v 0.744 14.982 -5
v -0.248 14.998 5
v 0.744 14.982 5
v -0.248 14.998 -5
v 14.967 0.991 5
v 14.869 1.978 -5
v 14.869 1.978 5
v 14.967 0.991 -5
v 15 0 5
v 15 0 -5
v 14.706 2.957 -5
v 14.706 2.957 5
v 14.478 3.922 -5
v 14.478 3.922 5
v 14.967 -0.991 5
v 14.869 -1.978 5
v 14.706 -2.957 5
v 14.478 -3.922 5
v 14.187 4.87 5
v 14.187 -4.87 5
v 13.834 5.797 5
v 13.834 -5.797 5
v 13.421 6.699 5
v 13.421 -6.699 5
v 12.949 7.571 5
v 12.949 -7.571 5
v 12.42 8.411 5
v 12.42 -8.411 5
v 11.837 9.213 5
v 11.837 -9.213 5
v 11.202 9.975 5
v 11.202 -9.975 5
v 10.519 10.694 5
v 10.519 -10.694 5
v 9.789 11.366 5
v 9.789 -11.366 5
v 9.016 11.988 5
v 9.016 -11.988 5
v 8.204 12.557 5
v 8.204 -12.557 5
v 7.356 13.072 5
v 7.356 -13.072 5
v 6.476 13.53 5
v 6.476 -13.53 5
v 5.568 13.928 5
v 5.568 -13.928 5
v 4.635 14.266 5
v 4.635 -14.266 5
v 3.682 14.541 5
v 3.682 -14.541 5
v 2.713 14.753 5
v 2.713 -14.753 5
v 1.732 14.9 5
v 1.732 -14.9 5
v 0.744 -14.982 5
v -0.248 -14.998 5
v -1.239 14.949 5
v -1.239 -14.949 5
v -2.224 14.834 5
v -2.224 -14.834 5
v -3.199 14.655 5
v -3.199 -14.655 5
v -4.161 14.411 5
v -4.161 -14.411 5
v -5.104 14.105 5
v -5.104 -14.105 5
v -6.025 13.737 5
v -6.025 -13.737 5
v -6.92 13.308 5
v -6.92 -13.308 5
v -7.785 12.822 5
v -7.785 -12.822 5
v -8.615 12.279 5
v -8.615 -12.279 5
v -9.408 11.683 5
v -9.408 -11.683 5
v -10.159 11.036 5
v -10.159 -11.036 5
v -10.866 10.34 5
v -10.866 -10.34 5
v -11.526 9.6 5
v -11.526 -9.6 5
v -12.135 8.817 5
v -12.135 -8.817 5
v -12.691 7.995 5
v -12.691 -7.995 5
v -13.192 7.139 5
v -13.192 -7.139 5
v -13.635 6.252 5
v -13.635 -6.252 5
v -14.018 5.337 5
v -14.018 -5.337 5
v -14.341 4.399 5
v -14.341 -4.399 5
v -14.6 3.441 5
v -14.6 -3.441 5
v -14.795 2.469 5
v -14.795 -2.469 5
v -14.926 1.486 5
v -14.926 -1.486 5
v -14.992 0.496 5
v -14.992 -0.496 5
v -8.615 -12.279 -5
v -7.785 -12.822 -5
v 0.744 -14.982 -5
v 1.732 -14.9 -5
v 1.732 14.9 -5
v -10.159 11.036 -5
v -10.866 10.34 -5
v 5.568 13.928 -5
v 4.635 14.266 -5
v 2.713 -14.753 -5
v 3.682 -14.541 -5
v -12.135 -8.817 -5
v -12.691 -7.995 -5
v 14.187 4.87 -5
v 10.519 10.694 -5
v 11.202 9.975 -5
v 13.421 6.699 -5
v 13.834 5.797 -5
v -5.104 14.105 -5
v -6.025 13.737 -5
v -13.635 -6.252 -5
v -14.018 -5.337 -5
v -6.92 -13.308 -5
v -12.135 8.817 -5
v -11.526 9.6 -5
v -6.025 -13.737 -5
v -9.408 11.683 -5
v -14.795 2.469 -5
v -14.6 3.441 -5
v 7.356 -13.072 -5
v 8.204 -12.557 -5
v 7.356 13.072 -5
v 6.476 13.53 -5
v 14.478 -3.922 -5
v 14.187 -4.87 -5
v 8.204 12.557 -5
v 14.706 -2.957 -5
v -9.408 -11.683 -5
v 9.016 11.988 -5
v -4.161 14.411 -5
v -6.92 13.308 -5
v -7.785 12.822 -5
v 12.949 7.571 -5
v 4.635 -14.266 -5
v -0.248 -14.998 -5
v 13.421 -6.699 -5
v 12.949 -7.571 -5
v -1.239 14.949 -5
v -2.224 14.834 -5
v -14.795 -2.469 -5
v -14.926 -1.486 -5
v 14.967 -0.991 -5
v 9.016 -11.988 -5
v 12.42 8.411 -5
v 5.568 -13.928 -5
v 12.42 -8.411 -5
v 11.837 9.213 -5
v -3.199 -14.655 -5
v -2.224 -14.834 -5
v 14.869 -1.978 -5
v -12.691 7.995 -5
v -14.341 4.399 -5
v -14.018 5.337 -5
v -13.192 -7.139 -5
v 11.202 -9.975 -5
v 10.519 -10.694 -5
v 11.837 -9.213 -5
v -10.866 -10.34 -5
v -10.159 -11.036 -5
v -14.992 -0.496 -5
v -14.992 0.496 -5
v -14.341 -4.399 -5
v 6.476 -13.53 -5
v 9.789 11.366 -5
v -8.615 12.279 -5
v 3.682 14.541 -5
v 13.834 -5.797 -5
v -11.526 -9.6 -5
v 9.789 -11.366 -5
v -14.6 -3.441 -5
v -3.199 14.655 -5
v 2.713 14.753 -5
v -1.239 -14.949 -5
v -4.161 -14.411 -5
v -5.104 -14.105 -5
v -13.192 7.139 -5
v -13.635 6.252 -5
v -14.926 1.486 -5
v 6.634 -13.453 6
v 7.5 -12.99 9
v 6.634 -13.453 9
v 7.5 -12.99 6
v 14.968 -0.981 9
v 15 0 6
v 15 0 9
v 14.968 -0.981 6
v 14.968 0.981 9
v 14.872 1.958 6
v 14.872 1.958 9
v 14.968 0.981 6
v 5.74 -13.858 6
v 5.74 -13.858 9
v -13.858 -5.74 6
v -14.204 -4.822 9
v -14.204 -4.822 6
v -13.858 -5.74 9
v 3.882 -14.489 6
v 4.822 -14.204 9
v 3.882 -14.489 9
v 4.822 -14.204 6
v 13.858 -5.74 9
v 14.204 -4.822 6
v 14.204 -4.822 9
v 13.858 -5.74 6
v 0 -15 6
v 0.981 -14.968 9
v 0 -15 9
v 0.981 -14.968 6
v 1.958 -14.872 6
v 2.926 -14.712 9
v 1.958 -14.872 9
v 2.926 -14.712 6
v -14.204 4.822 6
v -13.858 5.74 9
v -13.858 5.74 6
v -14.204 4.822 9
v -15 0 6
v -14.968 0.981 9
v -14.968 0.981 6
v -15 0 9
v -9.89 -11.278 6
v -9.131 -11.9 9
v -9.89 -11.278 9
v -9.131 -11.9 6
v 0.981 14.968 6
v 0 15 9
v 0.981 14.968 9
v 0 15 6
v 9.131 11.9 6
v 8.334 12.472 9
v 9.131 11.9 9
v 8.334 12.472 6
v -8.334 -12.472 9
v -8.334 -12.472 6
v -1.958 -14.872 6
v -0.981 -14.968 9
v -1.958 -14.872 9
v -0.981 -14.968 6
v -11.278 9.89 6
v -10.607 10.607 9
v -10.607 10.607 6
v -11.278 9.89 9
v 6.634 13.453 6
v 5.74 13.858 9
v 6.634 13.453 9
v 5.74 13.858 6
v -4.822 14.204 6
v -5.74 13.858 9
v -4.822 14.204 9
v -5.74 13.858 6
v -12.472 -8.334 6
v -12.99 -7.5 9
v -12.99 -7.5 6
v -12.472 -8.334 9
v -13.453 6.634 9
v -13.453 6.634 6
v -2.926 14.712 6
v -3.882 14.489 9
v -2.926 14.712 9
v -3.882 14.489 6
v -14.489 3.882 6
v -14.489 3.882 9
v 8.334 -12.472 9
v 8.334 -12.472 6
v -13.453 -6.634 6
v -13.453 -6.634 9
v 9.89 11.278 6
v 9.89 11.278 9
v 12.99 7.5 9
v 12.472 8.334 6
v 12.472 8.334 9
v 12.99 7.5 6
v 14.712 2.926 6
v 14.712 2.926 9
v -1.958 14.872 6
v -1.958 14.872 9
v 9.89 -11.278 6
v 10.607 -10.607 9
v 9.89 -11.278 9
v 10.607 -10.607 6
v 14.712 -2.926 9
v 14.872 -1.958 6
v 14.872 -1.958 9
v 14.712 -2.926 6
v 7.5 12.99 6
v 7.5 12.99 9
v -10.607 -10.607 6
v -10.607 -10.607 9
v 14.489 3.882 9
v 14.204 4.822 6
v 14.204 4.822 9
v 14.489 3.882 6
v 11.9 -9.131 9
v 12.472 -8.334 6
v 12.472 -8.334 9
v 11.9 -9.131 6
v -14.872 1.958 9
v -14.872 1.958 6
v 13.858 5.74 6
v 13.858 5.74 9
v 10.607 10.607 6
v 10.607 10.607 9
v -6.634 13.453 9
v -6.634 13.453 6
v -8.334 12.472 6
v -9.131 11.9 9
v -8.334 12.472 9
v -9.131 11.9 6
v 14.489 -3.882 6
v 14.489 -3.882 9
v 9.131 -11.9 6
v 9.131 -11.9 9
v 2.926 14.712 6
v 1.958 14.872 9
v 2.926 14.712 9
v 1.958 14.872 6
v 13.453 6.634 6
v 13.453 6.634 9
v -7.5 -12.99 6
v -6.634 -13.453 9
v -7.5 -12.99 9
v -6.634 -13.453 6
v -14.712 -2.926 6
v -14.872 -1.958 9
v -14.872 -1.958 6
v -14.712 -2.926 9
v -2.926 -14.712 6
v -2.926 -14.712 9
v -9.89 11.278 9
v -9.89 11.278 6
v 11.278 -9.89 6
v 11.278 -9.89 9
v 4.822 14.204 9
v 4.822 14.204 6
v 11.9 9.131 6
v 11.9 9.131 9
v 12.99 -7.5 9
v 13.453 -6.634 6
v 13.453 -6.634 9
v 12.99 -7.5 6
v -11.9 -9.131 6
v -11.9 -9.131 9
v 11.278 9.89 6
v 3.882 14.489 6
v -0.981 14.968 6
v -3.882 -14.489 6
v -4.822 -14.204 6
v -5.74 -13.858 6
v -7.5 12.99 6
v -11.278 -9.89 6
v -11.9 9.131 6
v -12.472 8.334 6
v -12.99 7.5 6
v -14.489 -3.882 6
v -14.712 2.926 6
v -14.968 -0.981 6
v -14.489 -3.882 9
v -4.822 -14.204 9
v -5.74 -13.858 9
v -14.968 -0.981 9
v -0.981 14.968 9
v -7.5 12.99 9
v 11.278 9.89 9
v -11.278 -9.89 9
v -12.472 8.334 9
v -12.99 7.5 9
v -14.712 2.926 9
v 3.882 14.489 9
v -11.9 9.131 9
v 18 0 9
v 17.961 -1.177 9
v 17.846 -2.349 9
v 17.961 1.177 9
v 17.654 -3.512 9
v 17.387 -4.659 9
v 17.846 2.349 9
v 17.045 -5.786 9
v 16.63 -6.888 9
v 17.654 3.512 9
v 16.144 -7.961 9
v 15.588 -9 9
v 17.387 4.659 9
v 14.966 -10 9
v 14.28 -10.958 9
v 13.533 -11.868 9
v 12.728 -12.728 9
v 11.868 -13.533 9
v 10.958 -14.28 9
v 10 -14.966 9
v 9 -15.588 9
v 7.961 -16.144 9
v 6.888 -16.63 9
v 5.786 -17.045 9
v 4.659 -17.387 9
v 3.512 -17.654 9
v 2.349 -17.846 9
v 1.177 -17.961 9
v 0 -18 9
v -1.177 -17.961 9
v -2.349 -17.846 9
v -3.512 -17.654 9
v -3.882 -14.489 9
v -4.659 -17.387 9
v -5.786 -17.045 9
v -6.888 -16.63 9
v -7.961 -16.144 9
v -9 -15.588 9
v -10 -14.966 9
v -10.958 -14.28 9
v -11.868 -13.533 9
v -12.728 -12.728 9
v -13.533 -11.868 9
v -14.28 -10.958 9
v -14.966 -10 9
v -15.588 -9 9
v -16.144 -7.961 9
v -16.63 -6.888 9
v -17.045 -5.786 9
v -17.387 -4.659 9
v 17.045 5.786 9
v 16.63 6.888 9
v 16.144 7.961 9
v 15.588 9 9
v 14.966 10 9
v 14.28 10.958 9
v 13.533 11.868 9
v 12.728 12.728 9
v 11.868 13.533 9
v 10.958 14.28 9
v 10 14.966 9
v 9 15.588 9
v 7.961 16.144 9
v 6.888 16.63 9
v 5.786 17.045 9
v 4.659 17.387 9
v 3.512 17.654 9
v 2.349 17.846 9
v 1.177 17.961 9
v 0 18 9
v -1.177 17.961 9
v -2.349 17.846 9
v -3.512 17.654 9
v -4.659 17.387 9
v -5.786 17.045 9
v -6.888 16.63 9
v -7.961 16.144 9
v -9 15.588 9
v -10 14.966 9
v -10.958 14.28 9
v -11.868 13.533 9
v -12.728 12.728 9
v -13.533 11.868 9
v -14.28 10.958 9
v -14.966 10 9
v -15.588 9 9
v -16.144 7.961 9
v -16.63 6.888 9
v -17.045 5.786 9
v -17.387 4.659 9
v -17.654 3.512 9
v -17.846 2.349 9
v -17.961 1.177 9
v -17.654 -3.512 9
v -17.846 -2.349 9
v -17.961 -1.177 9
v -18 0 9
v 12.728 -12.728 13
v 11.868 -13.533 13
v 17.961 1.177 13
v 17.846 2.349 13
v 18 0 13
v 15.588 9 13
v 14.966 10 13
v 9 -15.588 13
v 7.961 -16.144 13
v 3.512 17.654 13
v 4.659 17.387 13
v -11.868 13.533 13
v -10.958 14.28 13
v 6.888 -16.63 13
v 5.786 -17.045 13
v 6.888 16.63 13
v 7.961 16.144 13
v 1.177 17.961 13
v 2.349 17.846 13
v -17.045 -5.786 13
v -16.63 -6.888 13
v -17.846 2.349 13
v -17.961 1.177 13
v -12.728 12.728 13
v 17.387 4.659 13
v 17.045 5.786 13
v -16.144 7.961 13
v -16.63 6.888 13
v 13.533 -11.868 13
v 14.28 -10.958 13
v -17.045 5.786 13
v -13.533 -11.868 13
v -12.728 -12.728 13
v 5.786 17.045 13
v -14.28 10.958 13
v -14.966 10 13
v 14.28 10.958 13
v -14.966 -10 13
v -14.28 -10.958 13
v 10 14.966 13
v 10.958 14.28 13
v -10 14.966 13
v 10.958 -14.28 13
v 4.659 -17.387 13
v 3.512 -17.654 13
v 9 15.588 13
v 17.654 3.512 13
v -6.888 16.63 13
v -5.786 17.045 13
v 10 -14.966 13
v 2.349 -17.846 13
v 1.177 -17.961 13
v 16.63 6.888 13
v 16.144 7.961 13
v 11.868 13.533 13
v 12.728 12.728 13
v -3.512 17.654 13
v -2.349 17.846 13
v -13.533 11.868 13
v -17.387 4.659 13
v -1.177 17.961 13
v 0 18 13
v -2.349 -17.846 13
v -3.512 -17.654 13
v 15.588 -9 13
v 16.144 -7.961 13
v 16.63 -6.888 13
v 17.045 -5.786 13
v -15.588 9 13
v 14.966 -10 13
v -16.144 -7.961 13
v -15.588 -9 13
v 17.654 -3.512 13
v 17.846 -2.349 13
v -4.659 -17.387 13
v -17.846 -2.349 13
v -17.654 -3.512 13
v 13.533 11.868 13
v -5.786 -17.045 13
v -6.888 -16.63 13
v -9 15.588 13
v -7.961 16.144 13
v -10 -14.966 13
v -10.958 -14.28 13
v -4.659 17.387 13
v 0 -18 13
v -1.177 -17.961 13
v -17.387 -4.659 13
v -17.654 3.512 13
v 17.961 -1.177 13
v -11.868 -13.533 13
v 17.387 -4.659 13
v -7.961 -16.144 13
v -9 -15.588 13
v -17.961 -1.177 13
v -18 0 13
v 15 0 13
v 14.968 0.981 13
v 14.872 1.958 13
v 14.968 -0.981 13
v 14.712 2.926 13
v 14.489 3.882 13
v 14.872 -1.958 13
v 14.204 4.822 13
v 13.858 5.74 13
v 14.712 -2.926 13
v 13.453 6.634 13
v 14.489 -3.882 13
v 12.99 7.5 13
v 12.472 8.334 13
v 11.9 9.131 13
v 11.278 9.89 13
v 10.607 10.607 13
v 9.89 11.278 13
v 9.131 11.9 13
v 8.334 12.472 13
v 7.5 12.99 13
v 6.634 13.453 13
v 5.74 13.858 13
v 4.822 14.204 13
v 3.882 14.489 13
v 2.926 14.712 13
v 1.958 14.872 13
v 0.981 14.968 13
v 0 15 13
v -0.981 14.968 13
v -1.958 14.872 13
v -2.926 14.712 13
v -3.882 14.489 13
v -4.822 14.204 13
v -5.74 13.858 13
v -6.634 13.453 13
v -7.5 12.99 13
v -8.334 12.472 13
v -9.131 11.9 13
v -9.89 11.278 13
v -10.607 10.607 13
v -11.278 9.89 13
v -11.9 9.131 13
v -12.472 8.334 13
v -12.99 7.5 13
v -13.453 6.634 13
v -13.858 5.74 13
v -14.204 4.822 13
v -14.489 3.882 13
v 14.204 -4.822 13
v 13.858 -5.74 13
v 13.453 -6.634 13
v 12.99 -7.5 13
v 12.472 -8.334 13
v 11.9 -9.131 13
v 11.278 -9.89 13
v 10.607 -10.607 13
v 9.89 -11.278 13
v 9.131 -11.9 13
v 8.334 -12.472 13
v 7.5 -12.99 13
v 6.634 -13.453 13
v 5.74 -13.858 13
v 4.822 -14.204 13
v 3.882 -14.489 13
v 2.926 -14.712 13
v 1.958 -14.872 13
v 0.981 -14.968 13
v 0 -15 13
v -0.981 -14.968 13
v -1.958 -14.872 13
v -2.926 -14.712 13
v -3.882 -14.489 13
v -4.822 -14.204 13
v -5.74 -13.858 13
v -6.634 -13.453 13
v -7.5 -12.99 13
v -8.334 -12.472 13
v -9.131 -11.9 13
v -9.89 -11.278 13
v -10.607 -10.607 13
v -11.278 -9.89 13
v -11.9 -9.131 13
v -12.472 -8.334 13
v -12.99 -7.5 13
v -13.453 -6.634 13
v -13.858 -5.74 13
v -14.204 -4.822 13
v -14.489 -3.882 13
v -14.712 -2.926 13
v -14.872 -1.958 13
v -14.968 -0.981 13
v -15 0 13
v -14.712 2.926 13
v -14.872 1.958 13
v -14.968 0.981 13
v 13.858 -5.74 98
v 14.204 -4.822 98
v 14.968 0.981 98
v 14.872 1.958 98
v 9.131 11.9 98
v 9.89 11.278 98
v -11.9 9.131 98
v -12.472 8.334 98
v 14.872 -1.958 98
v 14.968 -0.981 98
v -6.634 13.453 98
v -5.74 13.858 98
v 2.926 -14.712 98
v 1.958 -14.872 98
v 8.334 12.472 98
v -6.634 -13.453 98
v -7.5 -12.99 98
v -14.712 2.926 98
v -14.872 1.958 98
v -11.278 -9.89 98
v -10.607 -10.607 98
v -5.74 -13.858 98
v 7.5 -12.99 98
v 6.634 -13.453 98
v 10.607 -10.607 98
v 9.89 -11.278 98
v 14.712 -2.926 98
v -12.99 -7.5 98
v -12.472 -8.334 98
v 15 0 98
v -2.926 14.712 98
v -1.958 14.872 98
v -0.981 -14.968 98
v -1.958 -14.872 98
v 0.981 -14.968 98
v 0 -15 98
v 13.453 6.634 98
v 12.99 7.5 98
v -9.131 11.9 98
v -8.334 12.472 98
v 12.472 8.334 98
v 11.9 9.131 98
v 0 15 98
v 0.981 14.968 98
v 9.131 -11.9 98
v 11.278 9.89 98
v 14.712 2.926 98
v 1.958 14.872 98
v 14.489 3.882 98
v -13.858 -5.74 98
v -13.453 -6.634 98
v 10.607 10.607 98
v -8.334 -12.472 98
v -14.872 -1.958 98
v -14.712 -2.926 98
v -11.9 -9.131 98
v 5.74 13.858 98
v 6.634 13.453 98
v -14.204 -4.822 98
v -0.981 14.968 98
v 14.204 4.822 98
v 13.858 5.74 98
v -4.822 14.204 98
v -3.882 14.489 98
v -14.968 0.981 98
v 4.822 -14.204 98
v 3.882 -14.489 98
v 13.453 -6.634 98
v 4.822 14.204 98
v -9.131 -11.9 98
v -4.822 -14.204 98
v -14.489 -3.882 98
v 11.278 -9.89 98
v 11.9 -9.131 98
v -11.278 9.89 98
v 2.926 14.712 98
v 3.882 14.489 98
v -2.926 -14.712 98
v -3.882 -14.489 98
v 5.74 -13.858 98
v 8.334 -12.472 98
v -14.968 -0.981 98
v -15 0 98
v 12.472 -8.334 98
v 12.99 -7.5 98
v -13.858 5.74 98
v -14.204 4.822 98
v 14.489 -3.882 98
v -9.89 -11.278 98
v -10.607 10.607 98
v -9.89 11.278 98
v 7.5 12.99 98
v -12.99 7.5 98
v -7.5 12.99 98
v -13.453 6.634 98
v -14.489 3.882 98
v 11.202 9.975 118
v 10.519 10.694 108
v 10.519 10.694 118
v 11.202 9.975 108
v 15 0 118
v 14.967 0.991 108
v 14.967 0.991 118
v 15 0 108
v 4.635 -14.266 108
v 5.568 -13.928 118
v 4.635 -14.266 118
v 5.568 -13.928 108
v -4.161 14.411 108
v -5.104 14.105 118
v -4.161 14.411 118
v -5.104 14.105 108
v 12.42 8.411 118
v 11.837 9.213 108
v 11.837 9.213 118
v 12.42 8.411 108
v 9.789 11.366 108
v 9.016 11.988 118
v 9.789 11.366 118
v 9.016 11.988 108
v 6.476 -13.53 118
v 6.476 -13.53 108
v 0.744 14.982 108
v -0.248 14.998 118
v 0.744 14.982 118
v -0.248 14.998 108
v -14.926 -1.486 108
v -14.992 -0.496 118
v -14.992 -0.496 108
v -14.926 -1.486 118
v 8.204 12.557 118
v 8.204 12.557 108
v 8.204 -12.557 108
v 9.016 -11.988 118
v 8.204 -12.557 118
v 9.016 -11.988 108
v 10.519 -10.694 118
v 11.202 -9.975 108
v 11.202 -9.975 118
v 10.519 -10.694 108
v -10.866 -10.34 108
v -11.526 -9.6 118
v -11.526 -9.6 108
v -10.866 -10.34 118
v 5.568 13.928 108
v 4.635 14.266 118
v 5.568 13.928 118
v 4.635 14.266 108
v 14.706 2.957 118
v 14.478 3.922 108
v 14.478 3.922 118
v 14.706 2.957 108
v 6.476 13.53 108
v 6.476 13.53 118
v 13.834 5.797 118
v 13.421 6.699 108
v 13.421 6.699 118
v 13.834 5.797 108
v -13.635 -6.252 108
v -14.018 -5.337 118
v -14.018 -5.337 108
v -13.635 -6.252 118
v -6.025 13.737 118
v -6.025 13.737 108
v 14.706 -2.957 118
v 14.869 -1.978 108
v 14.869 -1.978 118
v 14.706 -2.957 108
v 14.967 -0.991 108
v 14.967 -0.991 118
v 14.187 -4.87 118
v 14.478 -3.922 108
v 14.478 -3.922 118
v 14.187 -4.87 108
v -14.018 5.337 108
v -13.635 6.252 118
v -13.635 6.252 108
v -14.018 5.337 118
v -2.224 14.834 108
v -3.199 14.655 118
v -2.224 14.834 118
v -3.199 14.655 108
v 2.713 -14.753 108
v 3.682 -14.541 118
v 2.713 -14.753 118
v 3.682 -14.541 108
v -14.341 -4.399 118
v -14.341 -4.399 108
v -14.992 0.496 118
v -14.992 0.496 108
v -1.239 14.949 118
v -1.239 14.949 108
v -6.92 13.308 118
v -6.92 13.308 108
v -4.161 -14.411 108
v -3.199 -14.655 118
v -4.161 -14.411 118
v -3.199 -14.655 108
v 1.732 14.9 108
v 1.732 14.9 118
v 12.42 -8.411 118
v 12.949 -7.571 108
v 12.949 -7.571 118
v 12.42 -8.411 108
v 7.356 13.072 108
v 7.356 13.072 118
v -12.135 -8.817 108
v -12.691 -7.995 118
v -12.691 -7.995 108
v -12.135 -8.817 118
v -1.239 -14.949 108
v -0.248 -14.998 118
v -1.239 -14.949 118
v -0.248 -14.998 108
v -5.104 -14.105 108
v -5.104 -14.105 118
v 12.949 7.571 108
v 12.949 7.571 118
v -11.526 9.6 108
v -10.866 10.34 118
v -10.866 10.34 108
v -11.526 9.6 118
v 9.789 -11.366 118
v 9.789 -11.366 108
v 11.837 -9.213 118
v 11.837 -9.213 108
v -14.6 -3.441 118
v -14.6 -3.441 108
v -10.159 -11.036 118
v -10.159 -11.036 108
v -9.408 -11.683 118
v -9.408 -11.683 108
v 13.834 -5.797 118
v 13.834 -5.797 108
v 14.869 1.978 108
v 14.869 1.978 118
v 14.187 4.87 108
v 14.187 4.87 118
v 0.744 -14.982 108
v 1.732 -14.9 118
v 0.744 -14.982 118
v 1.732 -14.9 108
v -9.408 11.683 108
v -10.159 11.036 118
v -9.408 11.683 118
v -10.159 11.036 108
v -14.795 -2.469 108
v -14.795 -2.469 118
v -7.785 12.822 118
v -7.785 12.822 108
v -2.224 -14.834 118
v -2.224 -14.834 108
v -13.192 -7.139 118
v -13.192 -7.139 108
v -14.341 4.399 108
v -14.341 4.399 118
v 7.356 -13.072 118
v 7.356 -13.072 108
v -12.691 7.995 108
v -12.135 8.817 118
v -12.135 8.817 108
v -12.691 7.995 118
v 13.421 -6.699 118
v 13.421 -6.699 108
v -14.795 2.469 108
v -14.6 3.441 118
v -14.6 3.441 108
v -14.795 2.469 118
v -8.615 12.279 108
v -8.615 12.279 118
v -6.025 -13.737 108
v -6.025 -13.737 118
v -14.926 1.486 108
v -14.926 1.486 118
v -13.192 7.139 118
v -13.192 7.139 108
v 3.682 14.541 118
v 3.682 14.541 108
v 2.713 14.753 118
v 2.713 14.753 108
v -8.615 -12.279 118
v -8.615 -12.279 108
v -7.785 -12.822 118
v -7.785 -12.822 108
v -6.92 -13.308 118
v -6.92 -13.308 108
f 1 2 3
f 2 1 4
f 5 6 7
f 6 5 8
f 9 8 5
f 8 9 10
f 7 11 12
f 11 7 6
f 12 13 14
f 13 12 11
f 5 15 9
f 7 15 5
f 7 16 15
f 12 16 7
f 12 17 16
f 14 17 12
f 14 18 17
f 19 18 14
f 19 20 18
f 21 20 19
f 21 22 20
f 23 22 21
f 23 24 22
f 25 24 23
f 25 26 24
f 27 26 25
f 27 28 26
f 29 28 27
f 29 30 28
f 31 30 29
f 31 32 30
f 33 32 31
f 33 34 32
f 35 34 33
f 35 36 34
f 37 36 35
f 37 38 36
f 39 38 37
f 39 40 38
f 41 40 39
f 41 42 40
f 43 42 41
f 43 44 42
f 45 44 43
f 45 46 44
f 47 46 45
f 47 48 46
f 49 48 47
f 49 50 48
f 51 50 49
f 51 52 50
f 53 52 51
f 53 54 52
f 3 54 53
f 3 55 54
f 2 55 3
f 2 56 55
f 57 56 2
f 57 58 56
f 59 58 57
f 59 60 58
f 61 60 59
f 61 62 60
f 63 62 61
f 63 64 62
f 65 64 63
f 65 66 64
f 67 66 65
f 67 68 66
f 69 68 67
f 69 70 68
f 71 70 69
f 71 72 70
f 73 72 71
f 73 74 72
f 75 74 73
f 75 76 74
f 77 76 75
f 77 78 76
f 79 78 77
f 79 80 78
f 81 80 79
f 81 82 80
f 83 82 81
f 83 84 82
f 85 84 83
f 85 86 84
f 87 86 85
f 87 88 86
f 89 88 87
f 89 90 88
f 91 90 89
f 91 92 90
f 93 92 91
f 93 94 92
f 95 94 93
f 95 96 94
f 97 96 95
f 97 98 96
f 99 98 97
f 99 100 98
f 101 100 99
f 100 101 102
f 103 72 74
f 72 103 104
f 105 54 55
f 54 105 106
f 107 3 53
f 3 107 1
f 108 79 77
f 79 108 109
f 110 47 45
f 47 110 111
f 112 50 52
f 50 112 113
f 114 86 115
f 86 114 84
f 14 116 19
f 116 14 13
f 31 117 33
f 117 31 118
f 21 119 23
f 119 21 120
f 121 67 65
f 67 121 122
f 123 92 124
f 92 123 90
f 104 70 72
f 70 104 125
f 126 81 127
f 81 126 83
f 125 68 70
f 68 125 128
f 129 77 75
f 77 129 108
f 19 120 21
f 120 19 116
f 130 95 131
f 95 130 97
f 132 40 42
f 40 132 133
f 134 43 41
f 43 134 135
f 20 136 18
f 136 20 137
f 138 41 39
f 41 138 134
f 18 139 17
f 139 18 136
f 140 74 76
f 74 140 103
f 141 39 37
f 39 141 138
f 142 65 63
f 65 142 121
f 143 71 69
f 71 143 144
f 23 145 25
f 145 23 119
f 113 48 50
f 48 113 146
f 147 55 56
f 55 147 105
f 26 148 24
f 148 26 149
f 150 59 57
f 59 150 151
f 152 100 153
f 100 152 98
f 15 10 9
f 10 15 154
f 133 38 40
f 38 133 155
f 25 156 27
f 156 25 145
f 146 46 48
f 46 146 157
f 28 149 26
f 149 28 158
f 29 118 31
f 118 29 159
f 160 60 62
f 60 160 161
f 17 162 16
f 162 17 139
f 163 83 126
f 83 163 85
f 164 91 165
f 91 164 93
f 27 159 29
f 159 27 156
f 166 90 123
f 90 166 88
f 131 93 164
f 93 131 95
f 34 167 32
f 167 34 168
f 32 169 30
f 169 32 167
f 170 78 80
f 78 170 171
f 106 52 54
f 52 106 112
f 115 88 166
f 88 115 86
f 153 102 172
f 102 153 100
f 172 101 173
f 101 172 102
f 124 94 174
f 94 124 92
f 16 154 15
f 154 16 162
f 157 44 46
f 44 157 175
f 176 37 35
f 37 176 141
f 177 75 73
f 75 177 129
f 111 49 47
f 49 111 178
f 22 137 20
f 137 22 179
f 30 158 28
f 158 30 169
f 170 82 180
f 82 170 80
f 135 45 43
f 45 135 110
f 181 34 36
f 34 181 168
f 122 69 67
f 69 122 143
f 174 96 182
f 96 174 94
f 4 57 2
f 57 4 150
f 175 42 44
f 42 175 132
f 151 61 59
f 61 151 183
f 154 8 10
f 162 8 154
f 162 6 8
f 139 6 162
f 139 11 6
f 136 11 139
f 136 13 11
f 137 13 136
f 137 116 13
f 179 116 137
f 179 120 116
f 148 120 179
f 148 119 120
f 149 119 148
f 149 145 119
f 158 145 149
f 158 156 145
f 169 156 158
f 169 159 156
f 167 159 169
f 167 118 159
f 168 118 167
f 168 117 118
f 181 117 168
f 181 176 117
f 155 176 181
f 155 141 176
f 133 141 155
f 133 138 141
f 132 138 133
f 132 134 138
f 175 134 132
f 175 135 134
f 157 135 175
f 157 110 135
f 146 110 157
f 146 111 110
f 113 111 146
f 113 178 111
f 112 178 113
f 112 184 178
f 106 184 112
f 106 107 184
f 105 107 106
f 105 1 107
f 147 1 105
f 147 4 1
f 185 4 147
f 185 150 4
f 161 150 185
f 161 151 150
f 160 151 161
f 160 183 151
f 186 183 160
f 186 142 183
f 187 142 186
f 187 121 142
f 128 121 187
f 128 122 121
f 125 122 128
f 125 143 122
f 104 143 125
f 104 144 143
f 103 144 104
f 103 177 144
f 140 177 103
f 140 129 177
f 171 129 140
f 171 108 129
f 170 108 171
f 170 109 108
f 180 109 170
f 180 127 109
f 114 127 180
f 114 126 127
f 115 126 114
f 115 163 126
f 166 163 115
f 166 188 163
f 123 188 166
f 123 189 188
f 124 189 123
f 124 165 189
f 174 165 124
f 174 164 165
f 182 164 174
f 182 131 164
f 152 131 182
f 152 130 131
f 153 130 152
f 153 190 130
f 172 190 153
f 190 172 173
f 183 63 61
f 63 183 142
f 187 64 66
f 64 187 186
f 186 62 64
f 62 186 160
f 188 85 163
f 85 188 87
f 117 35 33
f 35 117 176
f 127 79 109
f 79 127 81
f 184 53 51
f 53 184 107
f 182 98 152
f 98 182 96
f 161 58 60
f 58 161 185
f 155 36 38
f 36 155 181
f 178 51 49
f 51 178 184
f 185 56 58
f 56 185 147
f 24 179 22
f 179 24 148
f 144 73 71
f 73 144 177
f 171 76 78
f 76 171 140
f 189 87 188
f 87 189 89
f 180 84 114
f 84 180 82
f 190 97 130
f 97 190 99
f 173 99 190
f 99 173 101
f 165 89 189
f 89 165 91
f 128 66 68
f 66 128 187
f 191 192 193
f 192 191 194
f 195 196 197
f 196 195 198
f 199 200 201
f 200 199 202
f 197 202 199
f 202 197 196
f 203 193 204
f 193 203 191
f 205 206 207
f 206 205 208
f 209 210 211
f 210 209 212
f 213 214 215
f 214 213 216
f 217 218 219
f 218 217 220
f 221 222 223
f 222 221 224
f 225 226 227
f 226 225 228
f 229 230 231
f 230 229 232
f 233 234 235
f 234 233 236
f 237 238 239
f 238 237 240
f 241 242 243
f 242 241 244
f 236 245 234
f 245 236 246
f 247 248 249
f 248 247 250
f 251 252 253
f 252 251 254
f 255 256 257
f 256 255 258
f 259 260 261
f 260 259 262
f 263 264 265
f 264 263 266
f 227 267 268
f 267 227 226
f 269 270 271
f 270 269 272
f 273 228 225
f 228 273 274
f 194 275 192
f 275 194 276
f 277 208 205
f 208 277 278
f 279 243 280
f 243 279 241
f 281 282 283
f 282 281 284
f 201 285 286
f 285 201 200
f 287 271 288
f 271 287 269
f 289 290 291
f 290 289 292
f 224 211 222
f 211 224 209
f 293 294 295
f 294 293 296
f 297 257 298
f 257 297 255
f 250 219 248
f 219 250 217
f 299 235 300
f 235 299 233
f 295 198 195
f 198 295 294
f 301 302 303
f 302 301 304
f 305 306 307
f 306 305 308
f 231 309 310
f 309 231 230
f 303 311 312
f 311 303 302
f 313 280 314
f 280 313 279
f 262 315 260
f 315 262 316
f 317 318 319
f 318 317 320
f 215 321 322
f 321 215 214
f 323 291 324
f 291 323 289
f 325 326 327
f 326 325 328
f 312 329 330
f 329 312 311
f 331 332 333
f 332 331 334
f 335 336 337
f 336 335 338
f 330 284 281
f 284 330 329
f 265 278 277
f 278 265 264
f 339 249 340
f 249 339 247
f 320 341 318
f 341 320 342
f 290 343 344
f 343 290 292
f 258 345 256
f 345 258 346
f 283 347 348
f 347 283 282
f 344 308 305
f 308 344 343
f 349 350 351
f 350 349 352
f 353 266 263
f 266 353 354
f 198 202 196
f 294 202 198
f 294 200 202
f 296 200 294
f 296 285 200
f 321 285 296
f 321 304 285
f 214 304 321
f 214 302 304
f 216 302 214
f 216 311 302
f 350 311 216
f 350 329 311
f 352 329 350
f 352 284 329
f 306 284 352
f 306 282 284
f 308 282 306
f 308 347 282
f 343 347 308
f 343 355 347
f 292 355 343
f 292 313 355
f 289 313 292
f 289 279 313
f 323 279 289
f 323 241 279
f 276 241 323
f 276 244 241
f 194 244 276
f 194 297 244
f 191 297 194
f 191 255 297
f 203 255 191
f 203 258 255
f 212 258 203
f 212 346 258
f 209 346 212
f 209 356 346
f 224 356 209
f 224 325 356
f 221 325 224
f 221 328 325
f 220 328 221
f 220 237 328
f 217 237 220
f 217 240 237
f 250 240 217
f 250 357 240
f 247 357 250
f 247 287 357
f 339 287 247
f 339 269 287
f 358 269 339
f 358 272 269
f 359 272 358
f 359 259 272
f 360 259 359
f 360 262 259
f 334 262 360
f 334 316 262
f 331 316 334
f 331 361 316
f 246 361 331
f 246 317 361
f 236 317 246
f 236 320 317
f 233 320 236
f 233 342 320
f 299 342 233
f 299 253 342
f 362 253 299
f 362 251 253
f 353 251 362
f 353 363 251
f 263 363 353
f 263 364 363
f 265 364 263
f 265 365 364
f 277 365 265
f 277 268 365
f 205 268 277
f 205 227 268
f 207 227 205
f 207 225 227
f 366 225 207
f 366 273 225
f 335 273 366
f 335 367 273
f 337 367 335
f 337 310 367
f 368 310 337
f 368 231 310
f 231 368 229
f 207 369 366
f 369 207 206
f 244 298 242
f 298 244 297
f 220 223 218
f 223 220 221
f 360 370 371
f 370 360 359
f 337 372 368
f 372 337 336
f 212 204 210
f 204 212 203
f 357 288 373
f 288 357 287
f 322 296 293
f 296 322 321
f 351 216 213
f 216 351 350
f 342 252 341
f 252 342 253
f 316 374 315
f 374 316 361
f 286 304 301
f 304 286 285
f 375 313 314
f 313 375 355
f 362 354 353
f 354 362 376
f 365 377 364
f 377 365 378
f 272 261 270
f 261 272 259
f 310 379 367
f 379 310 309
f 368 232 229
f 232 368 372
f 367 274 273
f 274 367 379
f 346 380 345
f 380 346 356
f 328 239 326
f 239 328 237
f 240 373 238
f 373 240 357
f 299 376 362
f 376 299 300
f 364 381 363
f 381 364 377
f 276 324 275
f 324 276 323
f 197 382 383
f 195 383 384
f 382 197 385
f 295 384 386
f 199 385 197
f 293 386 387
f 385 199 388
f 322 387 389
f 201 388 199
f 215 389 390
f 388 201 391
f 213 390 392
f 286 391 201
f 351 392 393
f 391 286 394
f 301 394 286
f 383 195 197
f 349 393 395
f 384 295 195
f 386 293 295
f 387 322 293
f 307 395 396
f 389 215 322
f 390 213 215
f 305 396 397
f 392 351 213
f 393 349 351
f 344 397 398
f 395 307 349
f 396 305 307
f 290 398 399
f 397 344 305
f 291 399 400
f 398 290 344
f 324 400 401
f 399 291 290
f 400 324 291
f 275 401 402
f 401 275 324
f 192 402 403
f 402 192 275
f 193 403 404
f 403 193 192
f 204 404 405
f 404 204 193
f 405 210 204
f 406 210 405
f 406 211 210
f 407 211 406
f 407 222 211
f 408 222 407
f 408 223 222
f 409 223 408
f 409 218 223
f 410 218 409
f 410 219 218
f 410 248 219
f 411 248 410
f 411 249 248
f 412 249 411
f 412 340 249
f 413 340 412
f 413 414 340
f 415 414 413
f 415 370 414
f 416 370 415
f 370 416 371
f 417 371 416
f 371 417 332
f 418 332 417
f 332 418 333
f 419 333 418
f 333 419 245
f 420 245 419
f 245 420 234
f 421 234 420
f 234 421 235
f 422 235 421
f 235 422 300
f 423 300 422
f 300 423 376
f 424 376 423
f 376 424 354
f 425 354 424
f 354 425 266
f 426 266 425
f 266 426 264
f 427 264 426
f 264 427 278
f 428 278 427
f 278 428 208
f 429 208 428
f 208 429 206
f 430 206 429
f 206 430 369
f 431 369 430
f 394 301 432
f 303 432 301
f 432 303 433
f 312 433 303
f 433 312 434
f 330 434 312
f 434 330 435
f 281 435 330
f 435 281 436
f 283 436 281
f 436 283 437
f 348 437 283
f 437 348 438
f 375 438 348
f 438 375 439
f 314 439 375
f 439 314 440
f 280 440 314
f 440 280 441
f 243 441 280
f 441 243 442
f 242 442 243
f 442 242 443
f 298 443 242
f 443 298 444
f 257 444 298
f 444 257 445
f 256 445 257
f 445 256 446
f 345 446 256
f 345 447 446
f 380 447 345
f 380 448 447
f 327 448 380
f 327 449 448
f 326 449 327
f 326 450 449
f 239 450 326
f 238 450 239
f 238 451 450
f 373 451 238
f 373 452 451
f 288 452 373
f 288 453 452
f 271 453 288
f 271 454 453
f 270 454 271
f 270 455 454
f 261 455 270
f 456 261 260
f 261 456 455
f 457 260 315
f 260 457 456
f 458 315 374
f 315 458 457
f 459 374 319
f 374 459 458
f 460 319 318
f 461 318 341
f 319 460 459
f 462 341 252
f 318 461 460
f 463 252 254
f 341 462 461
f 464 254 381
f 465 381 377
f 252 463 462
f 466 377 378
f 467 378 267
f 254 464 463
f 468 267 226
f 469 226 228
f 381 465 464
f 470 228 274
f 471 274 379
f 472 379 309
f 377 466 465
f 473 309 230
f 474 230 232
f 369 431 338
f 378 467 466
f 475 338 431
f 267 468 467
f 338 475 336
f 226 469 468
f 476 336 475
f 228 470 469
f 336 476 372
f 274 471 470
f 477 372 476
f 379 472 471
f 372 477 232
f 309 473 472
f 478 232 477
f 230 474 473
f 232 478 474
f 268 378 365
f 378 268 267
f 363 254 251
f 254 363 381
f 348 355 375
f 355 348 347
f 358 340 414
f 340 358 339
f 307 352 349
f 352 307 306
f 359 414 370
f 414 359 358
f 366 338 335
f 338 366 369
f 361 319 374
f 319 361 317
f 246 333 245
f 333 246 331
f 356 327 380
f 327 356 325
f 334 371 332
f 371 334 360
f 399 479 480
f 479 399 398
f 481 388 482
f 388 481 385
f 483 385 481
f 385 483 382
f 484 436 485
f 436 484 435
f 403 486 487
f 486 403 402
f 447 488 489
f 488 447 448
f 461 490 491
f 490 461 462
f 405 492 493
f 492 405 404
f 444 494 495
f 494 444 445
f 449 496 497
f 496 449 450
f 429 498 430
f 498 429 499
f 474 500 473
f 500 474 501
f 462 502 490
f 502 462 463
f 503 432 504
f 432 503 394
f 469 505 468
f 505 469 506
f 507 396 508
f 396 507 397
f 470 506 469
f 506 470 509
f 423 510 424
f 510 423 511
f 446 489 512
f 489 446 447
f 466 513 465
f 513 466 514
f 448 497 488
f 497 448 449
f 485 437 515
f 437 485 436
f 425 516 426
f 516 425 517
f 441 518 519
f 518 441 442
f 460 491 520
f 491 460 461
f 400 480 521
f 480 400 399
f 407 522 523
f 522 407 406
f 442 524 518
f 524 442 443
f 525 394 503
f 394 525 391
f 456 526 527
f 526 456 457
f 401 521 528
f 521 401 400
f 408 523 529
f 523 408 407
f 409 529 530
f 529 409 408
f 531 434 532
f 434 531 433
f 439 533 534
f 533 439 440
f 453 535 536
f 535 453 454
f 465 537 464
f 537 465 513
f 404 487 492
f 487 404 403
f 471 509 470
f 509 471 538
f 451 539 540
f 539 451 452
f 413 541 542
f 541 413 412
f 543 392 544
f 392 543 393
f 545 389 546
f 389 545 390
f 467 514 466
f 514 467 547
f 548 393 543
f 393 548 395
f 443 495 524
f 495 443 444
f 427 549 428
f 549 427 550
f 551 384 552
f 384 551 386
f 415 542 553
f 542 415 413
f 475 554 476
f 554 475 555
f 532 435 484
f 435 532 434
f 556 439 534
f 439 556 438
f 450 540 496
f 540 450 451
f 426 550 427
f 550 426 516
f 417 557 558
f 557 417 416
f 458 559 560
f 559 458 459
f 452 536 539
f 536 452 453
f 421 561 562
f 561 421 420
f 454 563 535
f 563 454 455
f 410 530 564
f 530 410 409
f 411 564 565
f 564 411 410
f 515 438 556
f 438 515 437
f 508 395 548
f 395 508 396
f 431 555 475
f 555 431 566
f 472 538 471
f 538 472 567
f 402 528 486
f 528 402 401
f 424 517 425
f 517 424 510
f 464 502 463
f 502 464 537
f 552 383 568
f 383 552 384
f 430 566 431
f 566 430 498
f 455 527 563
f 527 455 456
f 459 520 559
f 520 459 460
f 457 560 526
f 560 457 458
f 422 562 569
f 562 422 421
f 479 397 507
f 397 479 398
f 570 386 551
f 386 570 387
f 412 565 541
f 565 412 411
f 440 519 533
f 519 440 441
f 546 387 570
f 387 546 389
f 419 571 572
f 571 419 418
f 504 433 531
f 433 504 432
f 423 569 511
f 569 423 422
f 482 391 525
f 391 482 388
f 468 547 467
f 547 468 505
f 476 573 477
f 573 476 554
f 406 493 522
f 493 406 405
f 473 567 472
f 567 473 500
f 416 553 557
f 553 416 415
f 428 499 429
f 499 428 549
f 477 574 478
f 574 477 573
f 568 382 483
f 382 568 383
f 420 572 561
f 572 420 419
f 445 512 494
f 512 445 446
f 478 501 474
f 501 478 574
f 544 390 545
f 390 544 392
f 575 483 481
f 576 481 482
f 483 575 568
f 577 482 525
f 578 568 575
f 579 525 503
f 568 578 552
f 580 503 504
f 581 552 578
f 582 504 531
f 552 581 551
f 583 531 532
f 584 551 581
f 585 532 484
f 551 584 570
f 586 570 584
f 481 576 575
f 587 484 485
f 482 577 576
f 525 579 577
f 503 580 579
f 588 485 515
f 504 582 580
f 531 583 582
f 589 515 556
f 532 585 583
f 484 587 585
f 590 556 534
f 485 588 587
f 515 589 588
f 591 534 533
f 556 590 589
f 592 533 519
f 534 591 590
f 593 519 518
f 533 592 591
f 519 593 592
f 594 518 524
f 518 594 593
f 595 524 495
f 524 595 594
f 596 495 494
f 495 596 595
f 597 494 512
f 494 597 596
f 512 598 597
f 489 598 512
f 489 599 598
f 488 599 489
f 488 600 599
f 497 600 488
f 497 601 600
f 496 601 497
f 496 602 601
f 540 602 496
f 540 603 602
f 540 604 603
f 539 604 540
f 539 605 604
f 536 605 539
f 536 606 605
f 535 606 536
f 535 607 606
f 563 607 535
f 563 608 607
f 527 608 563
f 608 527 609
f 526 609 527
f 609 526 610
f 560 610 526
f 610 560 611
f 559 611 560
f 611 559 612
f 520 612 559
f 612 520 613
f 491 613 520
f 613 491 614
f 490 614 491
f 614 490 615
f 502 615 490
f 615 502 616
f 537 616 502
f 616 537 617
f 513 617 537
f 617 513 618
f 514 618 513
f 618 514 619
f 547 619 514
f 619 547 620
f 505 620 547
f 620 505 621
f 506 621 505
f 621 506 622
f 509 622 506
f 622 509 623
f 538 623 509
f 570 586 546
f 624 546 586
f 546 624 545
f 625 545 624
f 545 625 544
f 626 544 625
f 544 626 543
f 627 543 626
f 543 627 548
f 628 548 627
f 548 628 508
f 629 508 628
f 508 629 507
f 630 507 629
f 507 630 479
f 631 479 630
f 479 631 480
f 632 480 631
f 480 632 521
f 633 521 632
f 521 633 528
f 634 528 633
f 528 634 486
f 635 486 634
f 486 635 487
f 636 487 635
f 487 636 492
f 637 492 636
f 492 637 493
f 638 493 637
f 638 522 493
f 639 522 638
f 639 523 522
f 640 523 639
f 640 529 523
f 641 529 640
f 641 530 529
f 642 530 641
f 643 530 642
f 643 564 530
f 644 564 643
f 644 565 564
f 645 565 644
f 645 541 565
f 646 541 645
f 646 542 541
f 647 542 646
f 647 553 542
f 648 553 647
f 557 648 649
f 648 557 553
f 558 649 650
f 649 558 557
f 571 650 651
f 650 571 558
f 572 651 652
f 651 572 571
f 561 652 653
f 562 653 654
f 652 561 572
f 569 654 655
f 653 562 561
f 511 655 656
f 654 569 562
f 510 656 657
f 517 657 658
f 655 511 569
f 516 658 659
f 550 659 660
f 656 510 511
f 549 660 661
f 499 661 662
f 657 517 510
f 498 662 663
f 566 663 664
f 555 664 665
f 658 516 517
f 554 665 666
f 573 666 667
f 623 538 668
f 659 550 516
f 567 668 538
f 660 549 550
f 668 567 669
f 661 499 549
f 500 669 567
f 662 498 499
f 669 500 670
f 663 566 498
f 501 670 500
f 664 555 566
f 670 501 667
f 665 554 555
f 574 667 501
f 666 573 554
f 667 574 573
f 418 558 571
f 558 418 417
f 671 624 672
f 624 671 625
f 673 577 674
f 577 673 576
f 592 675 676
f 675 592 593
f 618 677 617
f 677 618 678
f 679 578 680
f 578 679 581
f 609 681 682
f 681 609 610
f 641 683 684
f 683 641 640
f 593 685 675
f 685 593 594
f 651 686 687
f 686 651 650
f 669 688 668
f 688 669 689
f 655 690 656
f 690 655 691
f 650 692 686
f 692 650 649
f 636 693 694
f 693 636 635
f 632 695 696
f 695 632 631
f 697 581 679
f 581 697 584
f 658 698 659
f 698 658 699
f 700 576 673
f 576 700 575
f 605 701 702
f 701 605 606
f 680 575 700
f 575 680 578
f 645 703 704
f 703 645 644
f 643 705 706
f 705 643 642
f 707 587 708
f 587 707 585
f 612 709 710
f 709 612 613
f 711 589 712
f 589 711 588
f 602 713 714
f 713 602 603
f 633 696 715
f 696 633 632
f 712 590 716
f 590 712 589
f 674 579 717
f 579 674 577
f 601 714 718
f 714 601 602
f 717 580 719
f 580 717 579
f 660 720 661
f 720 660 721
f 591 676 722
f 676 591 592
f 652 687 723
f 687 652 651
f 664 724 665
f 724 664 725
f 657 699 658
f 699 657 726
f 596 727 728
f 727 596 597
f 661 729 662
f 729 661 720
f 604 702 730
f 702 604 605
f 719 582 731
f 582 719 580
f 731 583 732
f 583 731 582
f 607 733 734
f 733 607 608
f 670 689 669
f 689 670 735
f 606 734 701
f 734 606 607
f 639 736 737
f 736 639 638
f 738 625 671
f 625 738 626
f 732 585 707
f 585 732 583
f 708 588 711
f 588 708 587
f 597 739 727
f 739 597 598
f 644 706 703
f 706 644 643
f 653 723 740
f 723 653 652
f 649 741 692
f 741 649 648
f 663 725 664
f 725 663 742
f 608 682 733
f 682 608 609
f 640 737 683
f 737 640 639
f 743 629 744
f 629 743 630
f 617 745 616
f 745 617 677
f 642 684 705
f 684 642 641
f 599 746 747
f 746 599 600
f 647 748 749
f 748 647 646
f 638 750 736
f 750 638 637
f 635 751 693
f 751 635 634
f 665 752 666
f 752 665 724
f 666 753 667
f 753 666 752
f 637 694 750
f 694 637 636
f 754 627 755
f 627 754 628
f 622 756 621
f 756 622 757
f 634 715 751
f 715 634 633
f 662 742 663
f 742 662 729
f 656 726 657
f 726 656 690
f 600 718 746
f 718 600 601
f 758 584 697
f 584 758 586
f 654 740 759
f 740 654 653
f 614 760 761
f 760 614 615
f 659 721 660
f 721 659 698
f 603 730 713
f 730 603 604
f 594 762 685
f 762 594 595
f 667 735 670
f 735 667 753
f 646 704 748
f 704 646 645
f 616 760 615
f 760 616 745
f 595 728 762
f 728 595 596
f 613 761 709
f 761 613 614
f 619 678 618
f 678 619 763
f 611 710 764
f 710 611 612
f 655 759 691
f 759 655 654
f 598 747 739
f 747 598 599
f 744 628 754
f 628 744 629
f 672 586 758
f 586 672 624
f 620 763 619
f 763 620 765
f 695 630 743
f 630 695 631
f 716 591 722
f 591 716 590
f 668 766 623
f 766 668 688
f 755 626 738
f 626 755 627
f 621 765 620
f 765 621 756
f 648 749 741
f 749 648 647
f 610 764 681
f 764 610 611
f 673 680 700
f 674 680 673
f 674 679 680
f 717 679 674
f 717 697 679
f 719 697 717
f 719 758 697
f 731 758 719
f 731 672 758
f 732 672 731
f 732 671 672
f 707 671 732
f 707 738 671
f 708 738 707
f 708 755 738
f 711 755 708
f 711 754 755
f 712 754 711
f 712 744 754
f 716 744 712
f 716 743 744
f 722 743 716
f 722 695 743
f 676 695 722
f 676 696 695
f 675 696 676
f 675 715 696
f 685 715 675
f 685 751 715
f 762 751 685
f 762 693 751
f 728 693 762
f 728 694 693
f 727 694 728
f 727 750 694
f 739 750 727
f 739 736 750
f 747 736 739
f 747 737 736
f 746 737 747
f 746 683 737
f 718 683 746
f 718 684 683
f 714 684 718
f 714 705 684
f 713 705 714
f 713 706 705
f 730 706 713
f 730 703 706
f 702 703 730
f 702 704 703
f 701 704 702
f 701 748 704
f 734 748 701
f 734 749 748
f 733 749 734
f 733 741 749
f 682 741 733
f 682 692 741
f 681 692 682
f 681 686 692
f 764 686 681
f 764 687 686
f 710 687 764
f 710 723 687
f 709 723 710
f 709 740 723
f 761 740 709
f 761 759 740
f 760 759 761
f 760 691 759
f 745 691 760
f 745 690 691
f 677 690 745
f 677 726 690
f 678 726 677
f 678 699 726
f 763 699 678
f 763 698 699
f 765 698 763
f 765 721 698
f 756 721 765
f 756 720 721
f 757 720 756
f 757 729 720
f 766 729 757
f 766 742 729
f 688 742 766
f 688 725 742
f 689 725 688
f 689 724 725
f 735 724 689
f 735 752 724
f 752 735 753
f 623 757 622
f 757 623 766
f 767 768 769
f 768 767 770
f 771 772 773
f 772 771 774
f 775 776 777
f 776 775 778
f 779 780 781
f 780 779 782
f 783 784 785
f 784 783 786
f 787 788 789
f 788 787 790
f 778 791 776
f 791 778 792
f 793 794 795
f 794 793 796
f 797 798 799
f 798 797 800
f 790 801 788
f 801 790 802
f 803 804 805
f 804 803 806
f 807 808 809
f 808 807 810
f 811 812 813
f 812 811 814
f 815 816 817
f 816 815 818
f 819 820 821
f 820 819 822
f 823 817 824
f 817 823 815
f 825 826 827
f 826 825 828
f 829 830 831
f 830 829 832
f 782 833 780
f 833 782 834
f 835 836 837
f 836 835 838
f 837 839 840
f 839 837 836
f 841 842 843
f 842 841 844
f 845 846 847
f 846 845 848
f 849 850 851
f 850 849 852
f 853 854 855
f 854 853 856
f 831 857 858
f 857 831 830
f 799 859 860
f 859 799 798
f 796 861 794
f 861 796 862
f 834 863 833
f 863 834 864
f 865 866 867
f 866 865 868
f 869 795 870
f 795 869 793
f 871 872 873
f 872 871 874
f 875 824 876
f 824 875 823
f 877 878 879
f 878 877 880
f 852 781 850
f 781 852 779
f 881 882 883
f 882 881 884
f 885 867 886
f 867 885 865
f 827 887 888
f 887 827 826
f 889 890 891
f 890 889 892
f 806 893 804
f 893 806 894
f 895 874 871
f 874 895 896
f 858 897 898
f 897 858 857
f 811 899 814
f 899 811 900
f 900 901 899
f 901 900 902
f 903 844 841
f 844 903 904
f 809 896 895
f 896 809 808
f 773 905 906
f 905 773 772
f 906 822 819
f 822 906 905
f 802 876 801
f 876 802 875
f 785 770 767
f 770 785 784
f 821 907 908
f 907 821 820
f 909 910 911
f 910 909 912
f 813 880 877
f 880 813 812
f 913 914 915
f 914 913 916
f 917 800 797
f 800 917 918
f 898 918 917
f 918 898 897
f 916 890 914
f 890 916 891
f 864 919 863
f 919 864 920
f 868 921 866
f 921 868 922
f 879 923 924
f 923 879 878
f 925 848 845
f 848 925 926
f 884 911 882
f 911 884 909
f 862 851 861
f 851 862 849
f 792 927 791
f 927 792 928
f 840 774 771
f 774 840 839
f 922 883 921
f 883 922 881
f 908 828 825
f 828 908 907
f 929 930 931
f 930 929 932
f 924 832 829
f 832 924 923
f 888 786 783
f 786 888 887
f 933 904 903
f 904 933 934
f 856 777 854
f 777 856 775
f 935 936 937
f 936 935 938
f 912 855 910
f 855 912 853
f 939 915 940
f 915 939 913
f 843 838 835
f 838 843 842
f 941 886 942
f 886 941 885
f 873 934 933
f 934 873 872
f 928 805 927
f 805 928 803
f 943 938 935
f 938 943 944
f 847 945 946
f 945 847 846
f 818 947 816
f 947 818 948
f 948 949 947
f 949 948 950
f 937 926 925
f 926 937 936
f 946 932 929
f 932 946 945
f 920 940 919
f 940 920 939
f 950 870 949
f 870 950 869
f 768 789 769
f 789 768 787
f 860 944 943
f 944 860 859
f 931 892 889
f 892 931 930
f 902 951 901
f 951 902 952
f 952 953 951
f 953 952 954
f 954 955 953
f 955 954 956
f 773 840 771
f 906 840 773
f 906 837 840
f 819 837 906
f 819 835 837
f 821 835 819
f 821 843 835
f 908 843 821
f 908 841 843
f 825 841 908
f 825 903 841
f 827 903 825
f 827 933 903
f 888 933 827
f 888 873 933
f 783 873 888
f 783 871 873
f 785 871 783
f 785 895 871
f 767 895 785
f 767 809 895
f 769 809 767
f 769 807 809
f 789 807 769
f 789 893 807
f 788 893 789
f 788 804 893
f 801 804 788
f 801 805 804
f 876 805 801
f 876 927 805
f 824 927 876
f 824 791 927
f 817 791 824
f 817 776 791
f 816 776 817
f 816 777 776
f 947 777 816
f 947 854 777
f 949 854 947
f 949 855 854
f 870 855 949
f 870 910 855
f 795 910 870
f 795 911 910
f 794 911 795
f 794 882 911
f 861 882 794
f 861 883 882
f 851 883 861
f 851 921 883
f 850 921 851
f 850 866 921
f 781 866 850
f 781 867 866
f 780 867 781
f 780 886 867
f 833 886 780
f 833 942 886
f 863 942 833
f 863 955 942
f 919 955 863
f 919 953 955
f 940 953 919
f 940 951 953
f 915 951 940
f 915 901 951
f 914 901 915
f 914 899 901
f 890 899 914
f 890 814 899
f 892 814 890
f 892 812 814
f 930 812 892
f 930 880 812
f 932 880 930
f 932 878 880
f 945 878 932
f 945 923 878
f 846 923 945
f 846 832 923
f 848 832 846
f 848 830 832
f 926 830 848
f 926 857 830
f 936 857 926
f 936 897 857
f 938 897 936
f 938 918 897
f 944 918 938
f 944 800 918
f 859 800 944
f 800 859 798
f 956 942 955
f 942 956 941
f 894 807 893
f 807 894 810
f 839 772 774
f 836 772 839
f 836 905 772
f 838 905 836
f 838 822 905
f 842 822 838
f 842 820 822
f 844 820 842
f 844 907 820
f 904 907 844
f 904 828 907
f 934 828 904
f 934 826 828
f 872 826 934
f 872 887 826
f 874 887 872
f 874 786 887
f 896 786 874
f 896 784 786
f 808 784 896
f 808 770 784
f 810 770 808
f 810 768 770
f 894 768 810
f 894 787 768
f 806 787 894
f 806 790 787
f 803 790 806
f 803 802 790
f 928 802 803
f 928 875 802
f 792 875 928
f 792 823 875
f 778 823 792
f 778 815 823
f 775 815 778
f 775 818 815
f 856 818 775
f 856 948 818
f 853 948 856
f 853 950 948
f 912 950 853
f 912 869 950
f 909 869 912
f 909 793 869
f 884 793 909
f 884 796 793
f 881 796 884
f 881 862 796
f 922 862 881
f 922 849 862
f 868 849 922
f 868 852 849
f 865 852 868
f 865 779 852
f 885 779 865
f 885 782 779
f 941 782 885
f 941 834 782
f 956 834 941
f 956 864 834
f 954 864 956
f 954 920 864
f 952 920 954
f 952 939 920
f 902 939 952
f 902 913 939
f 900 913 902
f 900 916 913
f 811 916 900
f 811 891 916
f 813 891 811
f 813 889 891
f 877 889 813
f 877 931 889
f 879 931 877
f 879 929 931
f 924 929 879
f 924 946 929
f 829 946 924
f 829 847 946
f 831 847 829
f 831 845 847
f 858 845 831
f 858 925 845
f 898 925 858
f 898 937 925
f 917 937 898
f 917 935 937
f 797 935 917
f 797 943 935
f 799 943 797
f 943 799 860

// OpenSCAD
// file: BOSL2/threading.scad
// Minimal thread approximations for bundled gallery models.
// These preserve dimensions for preview/export without generating helical thread detail.

CENTER = [0, 0, 0];

module screw_thread(d=10, l=10, pitch=1, internal=false, anchor=CENTER) {
    center = anchor == CENTER;
    translate(center ? [0, 0, 0] : [0, 0, l / 2])
        cylinder(d=d, h=l, center=true);
}

module threaded_rod(d=10, l=10, pitch=1, internal=false, anchor=CENTER) {
    screw_thread(d=d, l=l, pitch=pitch, internal=internal, anchor=anchor);
}
// file: BOSL2/std.scad
// Minimal BOSL2 compatibility shim for bundled gallery models.
// It implements only the helpers used by the imported OpenSCAD projects.

CENTER = [0, 0, 0];
BOTTOM = [0, 0, -1];
TOP = [0, 0, 1];
LEFT = [-1, 0, 0];
RIGHT = [1, 0, 0];
FRONT = [0, -1, 0];
BACK = [0, 1, 0];

module up(z=0) {
    translate([0, 0, z]) children();
}

module down(z=0) {
    translate([0, 0, -z]) children();
}

module attach(anchor=CENTER) {
    children();
}

module cuboid(size=[1, 1, 1], anchor=CENTER) {
    center = anchor == CENTER;
    translate(center ? [0, 0, 0] : [0, 0, size[2] / 2])
        cube(size, center=true);
    children();
}

module xcyl(h=1, r=1, anchor=CENTER) {
    center = anchor == CENTER;
    translate(center ? [0, 0, 0] : [h / 2, 0, 0])
        rotate([0, 90, 0])
            cylinder(h=h, r=r, center=true);
}
// main file
//BOSL Threading Experiments

include <BOSL2/std.scad>
include <BOSL2/threading.scad>

threaded_rod(d=30, 
            h=12, 
            pitch=3, 
            $fa=1, 
            $fs=1, 
            end_len1=2.5, 
            bevel1=true,
            bevel2=false
            );

//30mm shaft
translate([0,0,6])
    cylinder(d=30, h=3, $fn=96);

translate([0,0,9])
  cylinder(d=36, h=4, $fn=96);

translate([0,0,13])  
cylinder(d=30, h=85, $fn=96);

translate([0,0,113])
threaded_rod(d=30, 
            h=30, 
            pitch=3, 
            $fa=1, 
            $fs=1, 
            end_len1=1, 
            bevel1=false,
            bevel2=true
            );
